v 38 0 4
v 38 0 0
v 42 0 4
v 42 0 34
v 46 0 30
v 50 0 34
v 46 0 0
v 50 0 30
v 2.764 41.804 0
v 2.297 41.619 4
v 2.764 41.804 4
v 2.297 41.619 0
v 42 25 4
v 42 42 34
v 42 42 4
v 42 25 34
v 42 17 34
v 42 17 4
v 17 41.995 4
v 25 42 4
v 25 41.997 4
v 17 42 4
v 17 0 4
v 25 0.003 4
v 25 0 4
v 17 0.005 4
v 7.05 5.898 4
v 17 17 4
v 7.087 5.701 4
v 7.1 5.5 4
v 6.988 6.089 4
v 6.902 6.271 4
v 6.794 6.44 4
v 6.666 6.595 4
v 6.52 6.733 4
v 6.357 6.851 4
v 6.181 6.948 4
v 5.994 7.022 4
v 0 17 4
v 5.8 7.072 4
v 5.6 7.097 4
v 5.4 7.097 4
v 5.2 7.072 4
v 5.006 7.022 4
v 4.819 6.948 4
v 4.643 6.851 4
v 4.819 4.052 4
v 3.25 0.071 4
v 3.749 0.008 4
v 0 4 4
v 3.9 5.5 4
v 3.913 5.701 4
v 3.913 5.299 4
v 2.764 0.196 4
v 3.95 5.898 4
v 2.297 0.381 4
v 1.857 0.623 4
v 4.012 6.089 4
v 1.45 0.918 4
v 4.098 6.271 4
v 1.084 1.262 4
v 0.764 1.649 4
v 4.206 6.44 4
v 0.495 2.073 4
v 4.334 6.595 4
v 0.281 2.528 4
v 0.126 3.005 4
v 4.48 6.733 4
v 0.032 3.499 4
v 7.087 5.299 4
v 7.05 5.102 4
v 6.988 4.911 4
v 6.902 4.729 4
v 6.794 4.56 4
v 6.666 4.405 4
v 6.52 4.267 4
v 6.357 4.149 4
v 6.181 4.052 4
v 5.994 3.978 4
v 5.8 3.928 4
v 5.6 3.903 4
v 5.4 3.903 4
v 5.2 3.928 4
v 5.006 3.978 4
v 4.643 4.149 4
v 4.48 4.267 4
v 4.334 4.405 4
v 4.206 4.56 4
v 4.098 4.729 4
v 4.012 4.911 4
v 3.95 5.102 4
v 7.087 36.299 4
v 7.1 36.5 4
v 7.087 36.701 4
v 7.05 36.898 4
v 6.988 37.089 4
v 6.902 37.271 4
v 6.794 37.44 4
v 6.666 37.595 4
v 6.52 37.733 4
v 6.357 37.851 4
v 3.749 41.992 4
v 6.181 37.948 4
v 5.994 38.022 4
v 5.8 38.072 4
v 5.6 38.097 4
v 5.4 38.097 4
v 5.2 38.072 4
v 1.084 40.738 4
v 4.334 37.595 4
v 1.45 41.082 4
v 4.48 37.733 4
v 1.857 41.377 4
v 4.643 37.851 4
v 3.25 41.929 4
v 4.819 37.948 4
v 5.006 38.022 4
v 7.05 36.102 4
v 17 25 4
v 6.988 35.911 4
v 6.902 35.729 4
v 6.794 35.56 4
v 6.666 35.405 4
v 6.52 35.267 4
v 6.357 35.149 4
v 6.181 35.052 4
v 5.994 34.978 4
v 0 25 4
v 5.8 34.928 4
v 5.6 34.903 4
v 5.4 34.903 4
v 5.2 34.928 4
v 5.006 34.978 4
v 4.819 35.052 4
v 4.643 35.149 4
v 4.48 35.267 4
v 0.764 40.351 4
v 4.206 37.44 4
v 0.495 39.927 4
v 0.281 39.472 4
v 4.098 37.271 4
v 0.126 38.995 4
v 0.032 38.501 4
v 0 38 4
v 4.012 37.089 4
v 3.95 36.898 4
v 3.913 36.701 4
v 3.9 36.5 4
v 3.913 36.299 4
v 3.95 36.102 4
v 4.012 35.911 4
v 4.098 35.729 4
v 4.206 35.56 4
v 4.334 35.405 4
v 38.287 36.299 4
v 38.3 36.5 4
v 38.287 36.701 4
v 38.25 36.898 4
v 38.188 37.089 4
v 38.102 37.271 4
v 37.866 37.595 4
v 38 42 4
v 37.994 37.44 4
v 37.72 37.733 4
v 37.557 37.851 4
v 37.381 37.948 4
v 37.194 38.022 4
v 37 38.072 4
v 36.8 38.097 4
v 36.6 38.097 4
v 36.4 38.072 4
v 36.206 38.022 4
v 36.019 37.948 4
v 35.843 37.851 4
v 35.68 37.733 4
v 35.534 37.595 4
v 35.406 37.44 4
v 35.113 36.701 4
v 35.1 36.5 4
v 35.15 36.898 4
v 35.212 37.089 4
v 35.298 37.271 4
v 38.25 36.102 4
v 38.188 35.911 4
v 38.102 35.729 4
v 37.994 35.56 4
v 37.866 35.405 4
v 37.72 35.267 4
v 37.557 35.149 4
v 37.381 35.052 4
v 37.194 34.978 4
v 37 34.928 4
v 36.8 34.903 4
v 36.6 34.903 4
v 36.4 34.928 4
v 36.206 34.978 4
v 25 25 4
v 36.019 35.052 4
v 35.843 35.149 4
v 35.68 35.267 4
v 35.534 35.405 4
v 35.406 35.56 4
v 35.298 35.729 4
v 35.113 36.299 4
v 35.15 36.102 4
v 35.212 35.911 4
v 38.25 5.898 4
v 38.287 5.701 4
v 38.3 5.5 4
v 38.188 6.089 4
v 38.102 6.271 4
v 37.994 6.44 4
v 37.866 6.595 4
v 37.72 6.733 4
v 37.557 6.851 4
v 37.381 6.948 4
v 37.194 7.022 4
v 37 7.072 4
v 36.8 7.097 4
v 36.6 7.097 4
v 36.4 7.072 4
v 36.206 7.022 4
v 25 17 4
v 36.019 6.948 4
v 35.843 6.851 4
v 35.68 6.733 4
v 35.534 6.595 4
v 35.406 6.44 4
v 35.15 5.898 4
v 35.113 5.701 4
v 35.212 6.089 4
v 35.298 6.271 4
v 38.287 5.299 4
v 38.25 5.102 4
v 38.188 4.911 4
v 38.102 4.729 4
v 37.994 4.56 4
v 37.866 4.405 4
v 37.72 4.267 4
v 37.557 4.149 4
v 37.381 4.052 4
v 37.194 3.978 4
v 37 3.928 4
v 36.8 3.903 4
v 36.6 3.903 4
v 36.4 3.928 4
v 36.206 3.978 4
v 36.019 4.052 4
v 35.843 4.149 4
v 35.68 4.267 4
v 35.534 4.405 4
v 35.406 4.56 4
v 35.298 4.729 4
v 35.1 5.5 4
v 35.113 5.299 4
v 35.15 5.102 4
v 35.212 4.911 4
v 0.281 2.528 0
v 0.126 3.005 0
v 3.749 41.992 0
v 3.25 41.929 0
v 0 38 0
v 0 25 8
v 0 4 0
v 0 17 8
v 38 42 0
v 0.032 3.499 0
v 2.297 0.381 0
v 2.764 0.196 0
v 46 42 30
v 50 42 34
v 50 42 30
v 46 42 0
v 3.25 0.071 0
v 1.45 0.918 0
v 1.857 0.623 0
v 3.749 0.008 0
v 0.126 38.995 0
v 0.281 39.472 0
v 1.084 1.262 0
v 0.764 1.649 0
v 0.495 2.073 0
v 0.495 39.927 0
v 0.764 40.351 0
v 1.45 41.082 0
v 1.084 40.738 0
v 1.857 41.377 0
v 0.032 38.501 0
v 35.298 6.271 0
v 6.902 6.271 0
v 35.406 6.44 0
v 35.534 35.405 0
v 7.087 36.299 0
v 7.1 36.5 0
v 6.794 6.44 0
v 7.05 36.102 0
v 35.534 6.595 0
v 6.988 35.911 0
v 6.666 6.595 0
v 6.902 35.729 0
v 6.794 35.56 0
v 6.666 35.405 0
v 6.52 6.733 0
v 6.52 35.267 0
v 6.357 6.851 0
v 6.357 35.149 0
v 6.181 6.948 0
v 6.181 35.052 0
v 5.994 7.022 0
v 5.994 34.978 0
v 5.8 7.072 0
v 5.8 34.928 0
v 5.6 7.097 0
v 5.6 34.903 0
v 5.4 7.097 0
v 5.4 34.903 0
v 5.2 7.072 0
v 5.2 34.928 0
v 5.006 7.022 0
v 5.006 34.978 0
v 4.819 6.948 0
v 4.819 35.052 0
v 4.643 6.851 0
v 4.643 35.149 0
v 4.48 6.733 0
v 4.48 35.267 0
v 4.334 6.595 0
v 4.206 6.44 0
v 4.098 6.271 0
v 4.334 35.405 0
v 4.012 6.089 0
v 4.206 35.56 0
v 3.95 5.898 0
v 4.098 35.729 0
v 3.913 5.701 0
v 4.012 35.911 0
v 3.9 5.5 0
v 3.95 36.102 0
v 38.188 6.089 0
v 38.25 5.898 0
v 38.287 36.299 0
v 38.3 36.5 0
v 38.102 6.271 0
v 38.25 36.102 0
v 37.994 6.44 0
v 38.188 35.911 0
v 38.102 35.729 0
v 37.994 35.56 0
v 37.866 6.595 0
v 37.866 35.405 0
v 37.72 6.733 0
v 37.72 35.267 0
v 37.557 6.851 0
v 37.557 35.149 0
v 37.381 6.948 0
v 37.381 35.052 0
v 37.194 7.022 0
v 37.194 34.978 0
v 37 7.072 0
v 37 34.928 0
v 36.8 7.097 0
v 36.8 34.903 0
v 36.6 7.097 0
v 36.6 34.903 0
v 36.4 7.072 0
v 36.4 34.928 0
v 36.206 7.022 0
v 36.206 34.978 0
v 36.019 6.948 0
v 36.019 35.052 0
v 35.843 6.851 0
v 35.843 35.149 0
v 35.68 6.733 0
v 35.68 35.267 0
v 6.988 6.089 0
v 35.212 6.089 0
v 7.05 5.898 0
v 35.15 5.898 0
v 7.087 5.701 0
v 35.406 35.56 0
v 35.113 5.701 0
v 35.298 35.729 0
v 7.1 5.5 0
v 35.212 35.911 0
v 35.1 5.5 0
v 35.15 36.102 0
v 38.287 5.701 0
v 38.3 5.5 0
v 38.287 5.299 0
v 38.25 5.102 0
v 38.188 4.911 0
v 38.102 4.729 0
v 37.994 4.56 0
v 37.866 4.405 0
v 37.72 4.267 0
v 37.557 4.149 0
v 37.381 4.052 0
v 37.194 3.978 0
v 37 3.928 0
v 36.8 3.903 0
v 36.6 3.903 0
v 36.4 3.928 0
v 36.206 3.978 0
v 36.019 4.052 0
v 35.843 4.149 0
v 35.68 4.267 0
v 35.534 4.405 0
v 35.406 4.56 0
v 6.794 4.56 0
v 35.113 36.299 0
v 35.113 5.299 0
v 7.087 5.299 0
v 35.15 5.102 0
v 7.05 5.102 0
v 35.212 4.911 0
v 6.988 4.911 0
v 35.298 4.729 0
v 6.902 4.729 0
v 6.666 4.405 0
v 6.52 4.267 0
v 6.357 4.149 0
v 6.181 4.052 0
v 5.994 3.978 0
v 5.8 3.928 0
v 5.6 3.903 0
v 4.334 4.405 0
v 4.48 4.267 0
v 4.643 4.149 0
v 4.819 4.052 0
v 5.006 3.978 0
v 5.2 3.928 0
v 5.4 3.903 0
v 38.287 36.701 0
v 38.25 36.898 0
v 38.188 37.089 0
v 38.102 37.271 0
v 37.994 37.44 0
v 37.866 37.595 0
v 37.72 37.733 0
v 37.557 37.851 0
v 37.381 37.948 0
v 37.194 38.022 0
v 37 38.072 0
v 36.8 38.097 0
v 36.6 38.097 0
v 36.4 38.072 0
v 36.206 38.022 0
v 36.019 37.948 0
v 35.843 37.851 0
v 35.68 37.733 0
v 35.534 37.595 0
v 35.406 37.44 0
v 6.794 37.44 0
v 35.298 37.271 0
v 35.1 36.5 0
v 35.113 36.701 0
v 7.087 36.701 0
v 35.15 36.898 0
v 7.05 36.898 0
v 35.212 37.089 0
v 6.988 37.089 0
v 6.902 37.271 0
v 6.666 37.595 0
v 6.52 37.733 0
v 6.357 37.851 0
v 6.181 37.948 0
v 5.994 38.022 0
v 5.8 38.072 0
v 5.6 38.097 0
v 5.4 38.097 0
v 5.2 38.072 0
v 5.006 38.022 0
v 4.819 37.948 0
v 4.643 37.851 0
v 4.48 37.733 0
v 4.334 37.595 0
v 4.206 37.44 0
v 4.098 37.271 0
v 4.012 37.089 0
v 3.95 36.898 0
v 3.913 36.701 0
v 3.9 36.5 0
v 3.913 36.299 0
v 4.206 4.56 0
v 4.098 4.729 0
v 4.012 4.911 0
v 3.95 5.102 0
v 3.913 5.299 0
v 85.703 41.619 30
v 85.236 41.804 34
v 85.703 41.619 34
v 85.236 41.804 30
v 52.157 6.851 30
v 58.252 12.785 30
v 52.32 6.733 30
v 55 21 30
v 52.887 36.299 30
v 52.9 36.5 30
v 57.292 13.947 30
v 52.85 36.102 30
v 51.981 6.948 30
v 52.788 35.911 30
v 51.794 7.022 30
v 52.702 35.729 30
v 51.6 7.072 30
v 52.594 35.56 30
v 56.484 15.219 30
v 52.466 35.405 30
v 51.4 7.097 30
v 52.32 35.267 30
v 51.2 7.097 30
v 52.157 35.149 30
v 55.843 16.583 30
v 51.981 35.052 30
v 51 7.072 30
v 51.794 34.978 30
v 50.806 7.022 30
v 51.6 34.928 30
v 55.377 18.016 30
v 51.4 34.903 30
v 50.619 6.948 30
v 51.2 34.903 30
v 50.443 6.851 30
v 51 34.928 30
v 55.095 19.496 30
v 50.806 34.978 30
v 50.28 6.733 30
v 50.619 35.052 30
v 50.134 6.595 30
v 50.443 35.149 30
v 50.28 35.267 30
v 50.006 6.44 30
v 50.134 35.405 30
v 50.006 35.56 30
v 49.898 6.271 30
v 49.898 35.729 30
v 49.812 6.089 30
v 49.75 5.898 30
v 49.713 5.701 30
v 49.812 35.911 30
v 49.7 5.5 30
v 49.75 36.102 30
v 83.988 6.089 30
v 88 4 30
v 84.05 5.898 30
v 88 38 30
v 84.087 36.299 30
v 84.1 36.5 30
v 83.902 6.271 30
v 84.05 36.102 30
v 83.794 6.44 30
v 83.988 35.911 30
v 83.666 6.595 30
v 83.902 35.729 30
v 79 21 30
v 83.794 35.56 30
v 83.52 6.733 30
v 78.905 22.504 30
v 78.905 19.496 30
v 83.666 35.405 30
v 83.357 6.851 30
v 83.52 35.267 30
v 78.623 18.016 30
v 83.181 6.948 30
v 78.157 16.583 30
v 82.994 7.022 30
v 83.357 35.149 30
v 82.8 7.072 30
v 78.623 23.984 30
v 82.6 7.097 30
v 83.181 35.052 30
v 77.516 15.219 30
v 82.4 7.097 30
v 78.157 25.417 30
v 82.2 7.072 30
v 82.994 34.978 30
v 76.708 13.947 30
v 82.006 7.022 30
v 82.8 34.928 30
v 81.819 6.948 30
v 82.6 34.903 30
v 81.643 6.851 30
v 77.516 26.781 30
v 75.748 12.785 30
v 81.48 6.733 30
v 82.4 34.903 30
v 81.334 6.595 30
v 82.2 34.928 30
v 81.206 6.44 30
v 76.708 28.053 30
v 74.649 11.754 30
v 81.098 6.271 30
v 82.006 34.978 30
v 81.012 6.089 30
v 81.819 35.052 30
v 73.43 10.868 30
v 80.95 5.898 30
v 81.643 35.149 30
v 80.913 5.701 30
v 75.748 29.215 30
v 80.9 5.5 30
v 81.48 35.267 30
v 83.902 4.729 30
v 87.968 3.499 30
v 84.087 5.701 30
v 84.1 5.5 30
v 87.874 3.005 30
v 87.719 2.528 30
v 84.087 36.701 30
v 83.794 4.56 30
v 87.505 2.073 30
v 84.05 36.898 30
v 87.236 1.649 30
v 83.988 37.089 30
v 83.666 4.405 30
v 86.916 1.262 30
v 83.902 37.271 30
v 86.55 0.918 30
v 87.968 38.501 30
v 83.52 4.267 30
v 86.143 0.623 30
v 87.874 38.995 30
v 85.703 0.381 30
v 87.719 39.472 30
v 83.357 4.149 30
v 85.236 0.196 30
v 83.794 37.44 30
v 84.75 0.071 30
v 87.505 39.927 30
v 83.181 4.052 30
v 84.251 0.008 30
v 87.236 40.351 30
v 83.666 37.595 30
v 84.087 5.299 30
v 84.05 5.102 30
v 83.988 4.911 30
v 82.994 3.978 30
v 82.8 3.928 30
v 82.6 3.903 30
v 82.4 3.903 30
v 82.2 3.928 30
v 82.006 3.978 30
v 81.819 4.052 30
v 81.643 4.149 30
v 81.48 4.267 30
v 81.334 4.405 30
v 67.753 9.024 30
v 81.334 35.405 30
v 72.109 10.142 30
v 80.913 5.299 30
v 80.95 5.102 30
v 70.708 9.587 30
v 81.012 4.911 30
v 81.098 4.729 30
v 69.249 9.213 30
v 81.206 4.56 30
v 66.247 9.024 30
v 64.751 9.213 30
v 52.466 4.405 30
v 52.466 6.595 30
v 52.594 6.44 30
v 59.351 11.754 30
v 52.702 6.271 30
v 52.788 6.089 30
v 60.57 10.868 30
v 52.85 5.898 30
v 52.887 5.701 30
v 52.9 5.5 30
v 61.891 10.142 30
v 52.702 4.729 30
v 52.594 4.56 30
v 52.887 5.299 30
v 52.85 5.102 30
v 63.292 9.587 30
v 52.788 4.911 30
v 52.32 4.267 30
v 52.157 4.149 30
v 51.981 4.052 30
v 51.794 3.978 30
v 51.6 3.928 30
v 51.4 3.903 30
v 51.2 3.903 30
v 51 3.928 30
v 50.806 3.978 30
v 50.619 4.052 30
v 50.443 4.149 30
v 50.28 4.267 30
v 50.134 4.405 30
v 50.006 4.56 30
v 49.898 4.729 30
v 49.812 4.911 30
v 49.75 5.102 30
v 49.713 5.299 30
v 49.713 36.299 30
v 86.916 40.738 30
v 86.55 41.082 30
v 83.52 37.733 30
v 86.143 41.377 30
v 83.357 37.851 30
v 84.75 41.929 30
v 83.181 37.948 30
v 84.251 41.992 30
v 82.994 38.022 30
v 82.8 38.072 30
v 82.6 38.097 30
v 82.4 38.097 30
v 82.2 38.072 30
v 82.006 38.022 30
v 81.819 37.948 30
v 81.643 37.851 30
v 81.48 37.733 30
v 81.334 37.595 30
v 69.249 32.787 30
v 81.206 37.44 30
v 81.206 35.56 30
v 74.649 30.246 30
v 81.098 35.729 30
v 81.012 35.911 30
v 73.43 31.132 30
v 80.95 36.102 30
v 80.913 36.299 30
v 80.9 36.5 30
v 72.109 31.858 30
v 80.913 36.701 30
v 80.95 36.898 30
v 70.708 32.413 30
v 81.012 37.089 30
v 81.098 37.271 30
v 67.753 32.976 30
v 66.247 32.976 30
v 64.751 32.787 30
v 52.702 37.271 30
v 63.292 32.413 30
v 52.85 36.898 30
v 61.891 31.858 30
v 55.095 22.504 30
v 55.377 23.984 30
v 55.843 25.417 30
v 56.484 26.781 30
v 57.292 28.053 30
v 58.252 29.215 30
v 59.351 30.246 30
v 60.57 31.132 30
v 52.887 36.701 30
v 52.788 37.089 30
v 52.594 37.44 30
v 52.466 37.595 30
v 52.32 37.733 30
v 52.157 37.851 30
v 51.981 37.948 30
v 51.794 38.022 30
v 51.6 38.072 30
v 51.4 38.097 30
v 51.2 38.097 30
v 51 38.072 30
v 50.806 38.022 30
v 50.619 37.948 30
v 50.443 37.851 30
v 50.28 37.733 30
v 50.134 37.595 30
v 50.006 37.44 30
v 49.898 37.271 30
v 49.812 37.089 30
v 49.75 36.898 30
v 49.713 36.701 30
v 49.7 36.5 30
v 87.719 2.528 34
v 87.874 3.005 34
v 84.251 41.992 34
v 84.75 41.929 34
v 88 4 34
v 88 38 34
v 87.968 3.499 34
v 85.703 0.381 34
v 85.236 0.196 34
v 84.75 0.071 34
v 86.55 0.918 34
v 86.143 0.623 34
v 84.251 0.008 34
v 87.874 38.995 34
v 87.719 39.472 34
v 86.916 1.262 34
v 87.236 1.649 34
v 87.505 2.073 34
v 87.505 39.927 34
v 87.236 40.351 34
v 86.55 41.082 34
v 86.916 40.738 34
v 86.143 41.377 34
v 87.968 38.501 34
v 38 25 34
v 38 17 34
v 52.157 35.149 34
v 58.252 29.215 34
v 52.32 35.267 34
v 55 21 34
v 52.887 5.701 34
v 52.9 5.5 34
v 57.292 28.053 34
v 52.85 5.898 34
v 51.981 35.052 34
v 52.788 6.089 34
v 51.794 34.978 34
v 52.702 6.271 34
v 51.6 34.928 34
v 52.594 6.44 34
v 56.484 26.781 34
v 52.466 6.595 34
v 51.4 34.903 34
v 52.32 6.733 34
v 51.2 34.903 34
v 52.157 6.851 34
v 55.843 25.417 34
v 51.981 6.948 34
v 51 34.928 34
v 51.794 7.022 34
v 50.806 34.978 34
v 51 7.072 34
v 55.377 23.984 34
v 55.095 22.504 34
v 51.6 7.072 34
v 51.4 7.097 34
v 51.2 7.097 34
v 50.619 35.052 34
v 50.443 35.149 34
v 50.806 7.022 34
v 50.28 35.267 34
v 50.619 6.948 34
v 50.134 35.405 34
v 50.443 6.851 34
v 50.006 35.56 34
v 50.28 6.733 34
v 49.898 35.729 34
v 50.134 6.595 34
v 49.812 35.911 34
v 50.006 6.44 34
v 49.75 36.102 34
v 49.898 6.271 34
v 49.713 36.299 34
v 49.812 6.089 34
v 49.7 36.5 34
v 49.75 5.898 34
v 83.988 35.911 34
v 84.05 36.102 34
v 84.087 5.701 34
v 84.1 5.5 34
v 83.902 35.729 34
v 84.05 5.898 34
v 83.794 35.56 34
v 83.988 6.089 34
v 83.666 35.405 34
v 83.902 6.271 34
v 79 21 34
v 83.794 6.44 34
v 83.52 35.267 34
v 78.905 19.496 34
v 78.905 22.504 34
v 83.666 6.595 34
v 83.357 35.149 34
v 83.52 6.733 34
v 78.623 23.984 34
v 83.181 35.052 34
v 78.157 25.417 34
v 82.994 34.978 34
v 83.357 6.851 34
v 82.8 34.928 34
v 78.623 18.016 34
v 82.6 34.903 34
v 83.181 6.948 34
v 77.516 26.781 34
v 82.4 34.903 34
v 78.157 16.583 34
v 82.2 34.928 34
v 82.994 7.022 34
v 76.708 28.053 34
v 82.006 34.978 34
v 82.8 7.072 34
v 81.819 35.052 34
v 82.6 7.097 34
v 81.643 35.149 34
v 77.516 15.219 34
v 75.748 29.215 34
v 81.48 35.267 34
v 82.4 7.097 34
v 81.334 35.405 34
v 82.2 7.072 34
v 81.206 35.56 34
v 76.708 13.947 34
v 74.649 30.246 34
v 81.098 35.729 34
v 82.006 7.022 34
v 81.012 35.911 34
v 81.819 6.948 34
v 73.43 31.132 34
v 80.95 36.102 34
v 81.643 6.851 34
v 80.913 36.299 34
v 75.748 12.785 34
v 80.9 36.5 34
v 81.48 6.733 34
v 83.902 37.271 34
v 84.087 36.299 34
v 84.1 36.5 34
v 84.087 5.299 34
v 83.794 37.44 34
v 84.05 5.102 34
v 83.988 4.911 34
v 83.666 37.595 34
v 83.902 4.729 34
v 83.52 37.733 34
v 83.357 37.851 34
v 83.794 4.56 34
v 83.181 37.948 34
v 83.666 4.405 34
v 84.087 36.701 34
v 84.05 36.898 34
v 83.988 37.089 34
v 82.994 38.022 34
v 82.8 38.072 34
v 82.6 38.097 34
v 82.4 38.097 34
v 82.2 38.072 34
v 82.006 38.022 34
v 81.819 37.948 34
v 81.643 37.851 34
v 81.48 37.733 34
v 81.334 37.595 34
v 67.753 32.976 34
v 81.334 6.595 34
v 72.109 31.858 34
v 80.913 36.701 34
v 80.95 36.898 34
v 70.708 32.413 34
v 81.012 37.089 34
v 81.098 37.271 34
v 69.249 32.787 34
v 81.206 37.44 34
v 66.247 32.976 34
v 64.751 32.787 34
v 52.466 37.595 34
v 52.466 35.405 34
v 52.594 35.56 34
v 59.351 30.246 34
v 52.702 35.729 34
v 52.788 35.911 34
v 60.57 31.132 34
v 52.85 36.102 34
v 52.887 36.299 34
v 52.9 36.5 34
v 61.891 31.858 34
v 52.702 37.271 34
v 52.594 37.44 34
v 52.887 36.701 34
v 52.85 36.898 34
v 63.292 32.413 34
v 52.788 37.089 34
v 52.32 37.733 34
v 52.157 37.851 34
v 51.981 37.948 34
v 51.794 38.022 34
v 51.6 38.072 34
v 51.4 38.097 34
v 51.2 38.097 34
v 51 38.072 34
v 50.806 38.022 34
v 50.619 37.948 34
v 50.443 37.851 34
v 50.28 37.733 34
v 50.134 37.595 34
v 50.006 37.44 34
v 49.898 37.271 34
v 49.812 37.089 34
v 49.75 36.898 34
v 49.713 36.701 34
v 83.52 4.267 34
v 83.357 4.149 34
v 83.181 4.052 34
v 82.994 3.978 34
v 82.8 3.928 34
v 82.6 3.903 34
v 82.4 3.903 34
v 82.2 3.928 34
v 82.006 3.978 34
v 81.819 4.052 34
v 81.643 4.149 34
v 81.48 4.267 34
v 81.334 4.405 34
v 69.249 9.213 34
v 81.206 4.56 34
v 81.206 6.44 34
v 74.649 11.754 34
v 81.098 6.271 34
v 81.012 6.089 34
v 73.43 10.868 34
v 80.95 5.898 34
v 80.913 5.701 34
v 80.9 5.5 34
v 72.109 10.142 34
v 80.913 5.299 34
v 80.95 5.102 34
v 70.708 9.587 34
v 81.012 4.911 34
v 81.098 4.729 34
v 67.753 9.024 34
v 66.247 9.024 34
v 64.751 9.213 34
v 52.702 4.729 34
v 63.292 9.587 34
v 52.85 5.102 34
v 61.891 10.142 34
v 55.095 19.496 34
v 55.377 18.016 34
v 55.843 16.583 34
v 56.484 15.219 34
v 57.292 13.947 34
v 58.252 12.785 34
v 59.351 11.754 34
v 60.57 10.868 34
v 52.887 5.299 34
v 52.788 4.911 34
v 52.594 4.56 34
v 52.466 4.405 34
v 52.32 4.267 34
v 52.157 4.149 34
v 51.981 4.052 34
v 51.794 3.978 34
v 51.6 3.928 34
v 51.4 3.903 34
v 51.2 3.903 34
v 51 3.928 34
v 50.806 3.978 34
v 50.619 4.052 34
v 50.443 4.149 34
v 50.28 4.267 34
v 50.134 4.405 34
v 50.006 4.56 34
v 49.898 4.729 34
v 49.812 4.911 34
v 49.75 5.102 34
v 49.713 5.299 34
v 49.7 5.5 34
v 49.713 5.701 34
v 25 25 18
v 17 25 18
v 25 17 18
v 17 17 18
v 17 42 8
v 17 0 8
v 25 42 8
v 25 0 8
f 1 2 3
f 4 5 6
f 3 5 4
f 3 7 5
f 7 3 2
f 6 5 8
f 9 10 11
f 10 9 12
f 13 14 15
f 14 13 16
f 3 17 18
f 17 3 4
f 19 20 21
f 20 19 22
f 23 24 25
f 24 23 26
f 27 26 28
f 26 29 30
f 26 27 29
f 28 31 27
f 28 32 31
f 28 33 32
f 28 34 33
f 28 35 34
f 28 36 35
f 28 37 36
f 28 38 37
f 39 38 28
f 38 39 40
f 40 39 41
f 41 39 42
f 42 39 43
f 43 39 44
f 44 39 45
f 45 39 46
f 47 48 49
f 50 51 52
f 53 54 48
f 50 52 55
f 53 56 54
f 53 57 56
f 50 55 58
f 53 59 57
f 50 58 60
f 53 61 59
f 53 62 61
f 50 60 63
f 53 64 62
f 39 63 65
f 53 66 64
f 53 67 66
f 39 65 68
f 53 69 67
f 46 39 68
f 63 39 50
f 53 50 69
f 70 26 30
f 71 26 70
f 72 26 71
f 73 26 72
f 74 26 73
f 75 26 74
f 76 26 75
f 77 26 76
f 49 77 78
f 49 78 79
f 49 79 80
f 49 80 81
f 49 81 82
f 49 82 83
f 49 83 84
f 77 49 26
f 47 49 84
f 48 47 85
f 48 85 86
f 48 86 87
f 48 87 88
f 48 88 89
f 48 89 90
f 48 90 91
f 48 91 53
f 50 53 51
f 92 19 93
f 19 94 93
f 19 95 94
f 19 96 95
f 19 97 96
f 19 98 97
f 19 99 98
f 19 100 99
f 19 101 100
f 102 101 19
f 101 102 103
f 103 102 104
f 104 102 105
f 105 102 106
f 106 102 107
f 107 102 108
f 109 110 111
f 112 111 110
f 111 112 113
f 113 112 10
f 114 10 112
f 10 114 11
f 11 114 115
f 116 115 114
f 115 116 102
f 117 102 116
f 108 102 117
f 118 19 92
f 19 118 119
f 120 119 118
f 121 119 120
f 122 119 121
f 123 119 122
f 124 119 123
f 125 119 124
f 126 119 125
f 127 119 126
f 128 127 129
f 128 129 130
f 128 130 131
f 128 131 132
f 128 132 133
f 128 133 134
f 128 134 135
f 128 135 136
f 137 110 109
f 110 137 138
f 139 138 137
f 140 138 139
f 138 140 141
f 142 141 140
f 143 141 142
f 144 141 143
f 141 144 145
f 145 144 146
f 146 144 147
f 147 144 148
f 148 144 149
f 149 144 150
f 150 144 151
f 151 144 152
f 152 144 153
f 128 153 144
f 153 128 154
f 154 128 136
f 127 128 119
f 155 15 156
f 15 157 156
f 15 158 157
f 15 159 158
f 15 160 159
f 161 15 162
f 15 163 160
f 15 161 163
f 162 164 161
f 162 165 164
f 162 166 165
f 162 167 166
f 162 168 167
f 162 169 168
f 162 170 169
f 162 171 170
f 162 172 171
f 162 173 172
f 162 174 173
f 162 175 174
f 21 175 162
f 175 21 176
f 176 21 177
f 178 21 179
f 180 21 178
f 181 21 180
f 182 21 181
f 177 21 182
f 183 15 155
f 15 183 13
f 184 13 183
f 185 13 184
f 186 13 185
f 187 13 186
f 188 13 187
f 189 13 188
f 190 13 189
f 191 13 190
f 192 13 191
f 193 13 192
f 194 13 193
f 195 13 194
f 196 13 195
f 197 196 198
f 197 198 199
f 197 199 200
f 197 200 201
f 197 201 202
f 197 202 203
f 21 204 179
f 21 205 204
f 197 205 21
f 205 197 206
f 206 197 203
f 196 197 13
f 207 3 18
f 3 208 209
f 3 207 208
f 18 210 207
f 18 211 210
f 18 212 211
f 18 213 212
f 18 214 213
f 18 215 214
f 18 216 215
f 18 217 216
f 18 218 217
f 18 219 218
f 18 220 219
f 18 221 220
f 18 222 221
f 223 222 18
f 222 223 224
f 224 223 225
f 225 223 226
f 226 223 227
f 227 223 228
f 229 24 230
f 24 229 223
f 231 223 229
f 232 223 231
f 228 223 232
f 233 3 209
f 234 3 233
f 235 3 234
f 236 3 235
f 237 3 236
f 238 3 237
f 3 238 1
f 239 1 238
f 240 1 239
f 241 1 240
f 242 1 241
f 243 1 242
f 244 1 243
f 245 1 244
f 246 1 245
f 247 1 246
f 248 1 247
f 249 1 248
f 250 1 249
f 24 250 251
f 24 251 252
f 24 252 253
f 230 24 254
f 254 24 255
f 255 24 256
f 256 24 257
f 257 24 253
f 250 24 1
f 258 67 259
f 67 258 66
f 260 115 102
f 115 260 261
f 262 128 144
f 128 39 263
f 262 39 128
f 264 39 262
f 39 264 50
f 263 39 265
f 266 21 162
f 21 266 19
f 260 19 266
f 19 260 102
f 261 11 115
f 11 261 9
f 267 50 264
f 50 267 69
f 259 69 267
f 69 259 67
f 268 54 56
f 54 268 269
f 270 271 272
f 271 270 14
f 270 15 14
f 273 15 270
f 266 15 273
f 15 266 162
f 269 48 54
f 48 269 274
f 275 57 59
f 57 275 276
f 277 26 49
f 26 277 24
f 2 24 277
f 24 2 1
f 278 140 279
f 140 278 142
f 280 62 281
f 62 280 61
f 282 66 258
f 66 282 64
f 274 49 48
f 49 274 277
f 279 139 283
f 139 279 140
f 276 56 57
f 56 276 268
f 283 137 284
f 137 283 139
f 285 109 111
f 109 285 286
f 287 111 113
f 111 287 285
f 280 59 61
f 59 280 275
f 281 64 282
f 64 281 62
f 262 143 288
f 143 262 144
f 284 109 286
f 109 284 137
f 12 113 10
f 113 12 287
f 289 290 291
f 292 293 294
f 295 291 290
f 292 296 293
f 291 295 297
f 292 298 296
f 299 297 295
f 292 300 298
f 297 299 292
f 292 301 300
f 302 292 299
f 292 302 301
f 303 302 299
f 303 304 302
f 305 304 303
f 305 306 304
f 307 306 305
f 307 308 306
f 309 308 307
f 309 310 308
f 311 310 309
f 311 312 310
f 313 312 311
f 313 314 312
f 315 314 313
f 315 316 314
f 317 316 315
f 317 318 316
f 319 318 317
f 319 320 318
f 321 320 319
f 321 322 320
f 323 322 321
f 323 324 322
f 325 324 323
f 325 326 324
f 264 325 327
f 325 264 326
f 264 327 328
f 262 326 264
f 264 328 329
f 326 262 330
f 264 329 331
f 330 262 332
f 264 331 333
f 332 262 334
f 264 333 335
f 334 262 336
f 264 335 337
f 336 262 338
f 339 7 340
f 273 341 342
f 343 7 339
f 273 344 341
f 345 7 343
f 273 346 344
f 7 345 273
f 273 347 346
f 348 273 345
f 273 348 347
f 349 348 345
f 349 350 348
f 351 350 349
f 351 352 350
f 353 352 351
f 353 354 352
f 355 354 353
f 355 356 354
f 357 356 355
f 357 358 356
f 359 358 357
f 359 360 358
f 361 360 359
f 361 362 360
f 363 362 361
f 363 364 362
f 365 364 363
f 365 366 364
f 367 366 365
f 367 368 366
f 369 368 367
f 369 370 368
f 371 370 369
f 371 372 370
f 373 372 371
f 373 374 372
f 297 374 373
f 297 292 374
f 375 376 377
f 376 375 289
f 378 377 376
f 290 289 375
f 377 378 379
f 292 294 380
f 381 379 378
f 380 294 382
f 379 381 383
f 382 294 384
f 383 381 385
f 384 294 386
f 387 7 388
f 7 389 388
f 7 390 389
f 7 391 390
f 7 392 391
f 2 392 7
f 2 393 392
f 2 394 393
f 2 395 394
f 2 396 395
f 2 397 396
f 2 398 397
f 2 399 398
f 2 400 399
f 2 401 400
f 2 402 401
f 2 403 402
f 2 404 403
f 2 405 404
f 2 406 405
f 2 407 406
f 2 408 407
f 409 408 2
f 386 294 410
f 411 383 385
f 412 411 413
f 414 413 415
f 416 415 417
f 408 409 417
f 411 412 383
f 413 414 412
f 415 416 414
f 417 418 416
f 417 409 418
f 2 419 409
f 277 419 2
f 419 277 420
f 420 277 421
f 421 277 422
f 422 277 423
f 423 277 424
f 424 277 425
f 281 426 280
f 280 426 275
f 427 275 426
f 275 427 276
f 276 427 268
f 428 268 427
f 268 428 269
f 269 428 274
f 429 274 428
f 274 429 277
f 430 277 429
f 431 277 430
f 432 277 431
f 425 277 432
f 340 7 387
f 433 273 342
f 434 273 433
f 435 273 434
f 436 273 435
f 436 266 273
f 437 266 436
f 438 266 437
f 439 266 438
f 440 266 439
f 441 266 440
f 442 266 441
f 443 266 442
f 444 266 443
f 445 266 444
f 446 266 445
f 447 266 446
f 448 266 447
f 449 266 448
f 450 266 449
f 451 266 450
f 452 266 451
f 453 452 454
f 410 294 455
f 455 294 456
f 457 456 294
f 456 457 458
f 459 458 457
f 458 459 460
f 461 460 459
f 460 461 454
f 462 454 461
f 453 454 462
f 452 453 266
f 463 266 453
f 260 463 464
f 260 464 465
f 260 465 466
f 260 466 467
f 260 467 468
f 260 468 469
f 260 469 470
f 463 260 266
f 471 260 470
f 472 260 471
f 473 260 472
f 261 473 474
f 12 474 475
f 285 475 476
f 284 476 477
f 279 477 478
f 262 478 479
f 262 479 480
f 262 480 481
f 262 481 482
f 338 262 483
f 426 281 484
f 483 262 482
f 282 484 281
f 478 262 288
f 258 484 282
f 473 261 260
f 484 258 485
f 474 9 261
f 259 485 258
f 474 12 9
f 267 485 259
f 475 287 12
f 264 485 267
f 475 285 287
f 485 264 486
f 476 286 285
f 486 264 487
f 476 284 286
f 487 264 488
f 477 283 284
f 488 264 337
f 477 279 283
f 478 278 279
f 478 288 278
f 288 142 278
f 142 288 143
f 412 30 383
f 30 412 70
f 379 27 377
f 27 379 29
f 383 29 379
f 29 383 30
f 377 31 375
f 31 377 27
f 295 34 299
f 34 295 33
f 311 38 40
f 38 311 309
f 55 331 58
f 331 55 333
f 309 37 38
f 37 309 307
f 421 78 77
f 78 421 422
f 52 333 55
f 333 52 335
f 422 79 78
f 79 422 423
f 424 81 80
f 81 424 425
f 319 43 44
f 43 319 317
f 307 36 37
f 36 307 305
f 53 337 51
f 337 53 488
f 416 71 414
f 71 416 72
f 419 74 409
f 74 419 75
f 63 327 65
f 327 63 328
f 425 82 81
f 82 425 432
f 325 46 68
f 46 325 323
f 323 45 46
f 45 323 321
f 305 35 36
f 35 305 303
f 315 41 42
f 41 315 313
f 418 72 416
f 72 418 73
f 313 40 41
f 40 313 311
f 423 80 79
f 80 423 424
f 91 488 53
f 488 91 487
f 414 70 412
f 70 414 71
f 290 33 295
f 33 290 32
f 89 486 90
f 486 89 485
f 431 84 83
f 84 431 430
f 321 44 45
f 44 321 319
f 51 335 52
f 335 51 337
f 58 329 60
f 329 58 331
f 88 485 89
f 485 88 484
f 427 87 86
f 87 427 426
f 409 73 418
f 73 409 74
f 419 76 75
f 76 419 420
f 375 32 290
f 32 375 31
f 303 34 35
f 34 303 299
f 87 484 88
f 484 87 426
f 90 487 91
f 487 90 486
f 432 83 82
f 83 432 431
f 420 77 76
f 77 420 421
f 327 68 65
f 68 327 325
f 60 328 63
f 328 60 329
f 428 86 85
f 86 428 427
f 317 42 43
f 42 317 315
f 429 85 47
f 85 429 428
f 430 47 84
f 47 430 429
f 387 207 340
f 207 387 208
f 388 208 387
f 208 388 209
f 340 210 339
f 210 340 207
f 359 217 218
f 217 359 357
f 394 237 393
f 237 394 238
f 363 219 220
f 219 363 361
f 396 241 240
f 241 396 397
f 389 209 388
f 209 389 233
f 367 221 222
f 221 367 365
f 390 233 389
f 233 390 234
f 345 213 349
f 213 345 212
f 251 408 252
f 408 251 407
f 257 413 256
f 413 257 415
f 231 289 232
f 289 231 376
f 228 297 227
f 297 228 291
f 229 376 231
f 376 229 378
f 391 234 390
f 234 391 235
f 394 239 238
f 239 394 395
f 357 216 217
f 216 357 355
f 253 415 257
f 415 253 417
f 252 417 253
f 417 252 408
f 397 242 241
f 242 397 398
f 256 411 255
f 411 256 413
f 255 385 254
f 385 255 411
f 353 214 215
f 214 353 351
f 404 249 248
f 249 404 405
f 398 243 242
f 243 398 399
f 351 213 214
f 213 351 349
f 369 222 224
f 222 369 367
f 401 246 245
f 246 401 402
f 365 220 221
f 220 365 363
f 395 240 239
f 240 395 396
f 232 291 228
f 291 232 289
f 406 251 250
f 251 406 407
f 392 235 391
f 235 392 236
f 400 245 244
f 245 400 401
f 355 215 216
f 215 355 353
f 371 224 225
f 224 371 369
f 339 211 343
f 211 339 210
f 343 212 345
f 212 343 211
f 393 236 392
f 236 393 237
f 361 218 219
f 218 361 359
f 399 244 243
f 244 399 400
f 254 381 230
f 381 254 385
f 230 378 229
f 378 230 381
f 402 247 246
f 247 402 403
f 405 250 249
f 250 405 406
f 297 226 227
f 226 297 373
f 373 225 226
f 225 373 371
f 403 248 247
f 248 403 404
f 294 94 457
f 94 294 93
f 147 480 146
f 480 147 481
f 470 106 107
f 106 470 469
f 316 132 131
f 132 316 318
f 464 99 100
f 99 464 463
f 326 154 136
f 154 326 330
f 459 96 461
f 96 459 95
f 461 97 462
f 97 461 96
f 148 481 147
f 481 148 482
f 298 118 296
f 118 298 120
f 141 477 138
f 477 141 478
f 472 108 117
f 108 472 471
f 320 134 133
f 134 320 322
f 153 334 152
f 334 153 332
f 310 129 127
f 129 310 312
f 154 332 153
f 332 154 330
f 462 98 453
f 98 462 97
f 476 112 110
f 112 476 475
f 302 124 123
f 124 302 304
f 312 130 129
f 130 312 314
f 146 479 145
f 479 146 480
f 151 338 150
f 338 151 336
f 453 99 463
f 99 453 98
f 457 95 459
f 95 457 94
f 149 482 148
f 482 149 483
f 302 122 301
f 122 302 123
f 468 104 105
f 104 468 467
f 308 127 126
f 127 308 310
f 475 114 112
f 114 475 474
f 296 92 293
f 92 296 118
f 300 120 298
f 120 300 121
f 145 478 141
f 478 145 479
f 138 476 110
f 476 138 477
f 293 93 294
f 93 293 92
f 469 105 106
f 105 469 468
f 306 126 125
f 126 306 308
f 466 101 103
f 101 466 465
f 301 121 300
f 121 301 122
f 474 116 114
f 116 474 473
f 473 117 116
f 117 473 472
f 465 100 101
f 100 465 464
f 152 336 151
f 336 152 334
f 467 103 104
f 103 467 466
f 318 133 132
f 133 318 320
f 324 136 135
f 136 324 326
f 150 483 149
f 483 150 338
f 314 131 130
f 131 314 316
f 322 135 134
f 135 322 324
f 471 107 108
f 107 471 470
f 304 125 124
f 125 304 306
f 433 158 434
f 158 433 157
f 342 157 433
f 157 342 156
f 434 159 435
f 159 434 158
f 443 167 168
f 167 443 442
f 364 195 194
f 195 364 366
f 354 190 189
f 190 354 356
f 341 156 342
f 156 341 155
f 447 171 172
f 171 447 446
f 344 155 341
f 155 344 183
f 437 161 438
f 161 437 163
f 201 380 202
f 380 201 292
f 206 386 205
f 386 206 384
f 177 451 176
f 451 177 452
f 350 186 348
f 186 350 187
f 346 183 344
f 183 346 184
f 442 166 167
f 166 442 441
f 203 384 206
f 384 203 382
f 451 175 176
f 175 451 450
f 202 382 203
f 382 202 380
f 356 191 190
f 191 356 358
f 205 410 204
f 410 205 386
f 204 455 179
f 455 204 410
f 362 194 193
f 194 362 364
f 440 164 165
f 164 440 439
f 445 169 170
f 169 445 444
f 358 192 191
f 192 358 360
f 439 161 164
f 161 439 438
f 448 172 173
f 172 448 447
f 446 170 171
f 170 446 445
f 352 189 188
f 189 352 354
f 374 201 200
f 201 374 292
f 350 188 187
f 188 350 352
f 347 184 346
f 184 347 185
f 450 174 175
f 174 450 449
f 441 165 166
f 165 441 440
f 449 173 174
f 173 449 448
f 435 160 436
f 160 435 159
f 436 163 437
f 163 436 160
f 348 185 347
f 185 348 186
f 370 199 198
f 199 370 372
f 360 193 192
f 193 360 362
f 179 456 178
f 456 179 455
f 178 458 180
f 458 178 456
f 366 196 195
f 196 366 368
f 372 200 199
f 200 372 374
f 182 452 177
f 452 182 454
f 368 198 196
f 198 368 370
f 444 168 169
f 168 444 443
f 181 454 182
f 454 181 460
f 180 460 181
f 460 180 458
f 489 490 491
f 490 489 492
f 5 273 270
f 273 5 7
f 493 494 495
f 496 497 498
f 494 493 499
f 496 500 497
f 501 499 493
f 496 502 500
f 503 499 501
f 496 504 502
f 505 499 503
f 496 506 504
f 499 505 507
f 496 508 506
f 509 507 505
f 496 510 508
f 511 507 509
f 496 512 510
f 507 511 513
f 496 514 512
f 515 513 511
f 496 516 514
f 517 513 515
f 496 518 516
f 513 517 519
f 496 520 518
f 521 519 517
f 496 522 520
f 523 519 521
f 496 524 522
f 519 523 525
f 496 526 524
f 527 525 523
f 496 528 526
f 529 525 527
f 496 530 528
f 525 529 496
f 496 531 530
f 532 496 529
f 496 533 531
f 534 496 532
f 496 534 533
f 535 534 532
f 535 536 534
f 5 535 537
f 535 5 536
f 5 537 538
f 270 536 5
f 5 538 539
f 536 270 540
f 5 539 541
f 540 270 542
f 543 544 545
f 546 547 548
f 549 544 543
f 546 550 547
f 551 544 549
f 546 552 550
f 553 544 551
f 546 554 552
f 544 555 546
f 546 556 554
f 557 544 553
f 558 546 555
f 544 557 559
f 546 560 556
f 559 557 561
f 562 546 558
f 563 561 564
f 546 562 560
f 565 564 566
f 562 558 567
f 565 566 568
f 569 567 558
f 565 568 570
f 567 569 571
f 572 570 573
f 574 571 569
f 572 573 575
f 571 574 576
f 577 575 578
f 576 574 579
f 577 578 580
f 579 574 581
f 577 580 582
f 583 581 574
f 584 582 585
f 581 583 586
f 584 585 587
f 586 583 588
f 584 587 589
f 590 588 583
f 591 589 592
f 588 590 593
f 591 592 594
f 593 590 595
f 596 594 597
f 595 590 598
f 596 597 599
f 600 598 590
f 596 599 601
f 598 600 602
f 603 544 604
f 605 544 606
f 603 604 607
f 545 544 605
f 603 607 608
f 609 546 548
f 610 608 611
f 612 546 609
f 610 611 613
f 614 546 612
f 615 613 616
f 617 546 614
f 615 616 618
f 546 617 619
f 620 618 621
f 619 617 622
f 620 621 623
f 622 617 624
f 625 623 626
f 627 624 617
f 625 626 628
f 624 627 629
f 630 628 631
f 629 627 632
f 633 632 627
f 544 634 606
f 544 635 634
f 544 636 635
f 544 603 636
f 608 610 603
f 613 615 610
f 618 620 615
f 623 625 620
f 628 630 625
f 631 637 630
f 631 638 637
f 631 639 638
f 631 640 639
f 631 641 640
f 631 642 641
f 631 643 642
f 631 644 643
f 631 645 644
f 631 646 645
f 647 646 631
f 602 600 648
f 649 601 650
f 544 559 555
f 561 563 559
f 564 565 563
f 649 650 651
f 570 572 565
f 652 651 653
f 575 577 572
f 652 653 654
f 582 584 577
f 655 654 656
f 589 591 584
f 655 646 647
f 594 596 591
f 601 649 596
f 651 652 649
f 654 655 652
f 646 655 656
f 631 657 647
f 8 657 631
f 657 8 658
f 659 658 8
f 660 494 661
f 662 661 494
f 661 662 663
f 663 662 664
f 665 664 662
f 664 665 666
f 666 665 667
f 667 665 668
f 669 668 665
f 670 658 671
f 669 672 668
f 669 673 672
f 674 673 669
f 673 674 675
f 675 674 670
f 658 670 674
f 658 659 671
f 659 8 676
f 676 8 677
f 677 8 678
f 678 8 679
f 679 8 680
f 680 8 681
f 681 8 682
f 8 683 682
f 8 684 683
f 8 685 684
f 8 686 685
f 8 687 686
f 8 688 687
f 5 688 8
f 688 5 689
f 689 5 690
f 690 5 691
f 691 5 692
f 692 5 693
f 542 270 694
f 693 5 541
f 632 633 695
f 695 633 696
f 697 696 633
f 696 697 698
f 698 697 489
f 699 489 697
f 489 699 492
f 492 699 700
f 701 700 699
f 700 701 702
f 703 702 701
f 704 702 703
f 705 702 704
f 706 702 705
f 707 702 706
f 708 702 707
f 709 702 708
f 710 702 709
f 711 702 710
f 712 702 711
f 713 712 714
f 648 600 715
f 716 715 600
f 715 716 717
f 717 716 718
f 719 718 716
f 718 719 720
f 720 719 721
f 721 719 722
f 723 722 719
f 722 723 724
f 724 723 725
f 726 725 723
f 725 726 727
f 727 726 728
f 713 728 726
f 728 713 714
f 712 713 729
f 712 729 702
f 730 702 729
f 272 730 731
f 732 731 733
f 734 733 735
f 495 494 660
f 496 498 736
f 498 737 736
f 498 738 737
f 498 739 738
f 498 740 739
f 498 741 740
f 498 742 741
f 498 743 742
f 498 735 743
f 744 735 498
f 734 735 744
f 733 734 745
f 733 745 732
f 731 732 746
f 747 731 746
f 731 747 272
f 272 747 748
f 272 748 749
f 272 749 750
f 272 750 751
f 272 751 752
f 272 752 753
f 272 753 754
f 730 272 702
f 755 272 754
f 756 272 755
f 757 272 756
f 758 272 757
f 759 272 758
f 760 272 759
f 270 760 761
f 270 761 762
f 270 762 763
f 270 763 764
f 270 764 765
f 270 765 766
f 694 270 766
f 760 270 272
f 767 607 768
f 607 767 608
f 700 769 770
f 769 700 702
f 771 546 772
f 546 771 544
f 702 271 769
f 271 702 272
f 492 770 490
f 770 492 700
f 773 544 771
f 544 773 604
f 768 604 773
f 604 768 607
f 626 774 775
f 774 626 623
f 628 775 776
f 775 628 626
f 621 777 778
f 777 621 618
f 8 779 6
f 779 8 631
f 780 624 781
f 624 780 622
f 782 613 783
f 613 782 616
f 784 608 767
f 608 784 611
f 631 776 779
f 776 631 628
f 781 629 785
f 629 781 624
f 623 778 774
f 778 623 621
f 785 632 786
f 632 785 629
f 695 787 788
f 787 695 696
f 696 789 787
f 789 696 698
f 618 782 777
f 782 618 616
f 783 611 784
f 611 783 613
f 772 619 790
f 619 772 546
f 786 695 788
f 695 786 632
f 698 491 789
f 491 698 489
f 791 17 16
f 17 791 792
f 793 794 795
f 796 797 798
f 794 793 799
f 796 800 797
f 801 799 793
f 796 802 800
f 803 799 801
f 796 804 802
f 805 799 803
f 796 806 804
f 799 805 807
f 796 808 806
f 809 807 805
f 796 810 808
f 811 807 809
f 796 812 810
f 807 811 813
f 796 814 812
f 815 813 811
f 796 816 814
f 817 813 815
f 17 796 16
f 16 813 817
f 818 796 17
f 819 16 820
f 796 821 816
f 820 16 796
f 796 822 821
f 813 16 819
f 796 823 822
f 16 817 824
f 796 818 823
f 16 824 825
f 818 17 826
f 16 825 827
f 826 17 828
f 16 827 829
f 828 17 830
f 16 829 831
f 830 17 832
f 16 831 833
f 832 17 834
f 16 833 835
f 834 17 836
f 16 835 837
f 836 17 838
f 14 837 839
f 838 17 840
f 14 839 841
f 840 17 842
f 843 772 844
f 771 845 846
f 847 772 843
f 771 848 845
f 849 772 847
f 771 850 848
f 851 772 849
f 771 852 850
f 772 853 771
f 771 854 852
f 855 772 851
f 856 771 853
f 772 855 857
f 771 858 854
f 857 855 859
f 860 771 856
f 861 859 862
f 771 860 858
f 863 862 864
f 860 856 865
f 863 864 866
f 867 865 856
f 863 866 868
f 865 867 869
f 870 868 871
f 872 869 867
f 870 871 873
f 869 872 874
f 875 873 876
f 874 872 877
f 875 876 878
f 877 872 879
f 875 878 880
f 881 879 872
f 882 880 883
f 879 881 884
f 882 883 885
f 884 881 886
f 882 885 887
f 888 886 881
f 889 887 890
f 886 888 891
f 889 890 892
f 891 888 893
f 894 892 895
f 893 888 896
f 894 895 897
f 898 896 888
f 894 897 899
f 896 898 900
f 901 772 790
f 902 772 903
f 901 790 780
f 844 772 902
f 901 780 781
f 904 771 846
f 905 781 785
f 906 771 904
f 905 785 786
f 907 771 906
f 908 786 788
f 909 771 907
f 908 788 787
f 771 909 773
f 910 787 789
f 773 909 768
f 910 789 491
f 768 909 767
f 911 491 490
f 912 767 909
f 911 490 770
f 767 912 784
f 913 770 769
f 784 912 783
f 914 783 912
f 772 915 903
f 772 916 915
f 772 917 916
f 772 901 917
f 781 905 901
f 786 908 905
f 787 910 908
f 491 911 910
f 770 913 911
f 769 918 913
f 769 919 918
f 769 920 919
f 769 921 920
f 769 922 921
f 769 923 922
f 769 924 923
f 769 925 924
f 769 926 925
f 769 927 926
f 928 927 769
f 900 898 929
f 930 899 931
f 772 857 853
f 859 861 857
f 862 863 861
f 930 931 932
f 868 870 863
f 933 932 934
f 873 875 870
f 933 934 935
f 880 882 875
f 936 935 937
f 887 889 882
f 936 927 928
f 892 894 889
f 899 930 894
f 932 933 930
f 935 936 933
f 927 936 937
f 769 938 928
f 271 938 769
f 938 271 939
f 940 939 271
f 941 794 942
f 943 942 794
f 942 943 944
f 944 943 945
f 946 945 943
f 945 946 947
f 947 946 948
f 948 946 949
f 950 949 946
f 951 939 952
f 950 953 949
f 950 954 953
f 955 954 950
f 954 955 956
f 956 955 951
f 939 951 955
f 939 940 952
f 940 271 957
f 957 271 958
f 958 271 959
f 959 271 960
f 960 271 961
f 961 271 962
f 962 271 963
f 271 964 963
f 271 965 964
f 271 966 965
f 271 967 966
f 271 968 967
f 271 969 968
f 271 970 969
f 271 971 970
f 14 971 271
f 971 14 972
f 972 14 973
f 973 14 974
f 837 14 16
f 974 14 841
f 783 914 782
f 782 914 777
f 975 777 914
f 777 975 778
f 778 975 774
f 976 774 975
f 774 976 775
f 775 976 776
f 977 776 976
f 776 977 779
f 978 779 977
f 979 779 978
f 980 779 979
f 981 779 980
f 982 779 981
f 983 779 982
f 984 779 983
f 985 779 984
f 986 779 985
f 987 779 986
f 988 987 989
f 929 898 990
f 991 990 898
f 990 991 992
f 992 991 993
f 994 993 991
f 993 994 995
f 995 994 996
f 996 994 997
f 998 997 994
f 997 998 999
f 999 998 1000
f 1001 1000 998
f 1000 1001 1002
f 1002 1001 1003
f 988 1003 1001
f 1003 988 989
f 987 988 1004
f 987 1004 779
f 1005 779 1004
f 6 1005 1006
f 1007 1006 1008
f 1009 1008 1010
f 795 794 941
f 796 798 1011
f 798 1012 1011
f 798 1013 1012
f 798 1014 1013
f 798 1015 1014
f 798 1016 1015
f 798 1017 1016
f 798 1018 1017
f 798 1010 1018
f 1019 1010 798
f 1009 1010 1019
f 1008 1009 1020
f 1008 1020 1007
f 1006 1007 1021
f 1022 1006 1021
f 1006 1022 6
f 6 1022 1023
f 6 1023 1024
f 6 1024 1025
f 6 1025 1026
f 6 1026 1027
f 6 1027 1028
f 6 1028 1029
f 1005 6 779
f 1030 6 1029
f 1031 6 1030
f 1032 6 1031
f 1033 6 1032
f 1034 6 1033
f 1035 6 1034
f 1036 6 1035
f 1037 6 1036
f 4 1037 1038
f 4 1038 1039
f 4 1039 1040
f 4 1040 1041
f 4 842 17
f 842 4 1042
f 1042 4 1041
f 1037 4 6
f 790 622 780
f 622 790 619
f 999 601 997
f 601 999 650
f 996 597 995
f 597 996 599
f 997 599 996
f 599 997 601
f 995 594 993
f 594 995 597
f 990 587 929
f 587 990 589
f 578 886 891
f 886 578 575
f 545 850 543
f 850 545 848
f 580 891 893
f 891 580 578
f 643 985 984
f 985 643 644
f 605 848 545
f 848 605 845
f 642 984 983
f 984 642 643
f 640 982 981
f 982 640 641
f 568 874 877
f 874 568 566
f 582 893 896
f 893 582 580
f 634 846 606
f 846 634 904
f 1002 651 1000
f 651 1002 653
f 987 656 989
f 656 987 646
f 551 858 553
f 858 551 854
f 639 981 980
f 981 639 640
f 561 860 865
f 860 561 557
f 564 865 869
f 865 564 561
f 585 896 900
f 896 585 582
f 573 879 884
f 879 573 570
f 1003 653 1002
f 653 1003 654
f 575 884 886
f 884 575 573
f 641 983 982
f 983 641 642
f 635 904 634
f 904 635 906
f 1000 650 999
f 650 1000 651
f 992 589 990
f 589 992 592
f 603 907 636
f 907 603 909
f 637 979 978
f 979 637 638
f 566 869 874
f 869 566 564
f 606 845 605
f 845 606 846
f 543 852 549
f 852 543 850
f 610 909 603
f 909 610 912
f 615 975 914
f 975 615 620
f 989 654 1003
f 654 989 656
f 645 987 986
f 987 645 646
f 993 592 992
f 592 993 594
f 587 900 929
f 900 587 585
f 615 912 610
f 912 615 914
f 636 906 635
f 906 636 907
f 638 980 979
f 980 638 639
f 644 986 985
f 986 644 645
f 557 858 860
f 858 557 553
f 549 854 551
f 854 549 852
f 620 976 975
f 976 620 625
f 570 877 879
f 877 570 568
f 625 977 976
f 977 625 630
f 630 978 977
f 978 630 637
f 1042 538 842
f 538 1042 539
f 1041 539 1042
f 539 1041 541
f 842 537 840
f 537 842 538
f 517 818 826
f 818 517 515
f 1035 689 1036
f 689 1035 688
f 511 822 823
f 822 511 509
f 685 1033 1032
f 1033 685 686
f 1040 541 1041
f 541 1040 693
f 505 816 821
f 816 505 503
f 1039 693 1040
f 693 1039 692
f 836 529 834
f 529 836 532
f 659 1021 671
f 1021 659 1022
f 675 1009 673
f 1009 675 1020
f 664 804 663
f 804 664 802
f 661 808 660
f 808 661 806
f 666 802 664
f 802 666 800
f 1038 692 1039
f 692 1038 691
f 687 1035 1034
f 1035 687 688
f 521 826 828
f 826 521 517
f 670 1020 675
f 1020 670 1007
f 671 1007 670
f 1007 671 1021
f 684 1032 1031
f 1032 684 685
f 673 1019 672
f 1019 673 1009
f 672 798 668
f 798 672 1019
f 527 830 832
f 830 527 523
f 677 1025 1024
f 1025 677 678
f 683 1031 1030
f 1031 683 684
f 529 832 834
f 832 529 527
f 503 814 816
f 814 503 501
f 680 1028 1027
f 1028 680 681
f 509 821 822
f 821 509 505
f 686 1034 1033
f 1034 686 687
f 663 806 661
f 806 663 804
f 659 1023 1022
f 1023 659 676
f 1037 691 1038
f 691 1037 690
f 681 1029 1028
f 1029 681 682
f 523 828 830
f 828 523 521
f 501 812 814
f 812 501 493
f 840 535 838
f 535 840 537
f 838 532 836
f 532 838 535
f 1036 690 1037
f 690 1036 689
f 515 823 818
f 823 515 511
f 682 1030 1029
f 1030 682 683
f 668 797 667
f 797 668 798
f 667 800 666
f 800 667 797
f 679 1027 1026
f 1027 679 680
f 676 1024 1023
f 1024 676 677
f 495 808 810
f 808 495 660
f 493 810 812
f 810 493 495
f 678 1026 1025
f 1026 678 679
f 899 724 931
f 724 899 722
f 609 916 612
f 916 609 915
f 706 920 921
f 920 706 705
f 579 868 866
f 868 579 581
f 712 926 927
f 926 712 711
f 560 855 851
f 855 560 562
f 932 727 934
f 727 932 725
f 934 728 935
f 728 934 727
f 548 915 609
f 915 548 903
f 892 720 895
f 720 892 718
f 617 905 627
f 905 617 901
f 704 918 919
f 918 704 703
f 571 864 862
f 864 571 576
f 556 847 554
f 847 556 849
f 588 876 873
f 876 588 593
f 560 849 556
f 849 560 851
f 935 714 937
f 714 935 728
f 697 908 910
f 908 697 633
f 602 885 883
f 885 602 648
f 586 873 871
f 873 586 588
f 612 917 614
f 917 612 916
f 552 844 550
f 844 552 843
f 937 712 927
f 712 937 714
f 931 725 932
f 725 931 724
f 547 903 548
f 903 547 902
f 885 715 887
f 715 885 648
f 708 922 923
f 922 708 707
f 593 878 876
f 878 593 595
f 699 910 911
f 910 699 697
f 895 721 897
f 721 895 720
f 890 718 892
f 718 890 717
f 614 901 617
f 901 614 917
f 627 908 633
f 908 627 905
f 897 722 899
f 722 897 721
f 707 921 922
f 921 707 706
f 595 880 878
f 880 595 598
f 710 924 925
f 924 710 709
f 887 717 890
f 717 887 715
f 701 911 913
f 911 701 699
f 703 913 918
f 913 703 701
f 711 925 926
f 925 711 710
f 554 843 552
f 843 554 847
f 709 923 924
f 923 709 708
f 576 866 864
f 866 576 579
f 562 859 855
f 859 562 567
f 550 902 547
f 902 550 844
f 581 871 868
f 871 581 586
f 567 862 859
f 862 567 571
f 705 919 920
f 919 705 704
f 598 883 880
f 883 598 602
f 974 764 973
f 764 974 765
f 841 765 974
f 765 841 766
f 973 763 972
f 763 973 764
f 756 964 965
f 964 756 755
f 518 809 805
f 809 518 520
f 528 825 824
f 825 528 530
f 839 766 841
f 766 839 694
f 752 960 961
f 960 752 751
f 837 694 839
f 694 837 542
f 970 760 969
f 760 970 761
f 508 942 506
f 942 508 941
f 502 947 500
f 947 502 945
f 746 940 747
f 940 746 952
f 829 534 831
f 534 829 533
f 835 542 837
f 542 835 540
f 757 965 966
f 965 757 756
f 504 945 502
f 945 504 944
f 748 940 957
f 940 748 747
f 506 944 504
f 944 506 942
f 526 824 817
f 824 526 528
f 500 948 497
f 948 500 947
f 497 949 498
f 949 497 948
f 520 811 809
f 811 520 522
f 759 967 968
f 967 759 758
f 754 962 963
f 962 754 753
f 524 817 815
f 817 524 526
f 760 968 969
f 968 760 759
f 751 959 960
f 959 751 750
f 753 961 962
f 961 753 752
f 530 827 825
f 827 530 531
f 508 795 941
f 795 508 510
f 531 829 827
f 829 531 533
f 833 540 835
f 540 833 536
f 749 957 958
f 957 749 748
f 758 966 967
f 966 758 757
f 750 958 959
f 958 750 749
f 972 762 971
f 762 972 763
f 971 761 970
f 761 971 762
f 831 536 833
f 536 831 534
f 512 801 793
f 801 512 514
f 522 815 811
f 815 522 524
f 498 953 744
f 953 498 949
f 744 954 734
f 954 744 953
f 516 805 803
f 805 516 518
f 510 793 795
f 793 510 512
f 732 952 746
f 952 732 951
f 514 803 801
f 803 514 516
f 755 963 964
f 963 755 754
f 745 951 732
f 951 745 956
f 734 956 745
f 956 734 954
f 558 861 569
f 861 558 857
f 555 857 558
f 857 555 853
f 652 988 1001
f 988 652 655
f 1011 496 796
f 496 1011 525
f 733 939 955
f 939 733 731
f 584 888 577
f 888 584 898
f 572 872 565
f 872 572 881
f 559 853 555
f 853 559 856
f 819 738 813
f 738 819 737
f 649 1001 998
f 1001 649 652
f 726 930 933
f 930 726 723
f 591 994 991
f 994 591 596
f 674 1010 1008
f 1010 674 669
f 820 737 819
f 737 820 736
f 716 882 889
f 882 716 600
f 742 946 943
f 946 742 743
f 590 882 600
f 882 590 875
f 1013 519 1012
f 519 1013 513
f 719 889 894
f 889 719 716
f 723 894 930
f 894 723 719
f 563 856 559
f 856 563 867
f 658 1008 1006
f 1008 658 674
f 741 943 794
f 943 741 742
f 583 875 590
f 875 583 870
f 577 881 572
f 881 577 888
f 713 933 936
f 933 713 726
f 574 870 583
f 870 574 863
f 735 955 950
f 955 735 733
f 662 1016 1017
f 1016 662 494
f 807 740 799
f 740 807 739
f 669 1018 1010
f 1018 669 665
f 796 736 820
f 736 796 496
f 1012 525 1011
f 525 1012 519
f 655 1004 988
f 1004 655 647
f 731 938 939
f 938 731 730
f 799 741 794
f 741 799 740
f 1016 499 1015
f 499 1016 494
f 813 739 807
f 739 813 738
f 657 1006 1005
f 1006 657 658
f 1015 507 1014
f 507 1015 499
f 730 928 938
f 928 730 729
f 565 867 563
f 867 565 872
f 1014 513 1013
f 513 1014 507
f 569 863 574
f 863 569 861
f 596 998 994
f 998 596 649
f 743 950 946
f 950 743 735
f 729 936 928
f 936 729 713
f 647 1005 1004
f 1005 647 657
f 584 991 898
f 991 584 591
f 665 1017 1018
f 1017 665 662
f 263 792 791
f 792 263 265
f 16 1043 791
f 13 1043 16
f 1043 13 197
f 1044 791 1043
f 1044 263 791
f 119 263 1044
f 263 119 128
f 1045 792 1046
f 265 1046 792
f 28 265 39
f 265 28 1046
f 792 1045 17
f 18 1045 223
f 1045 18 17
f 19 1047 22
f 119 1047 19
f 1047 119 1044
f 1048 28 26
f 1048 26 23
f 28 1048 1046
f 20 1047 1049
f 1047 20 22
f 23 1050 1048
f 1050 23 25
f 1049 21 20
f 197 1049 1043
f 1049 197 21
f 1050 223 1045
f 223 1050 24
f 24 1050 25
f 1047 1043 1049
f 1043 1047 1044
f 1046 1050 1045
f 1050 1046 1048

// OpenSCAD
l = 42;
w = 42;

module plate() {

    difference() {

        // base
        hull() {
           translate([4,4,0]) cylinder($fn=50, r=4,h=4);
           translate([4,w-4,0]) cylinder($fn=50, r=4,h=4);
            translate([l-4,0,0]) cube([4,4,4]); //translate([l-4,4,0]) cylinder($fn=50, r=4,h=4);
           //translate([l-4,w-4,0]) cylinder($fn=50, r=4,h=4);
            translate([l-4,w-4,0]) cube([4,4,4]);
        }

        translate([3.9+1.6,3.9+1.6,-1]) cylinder($fn=50, r=1.6,h=6);
        translate([3.9+1.6+ 28 +3.2, 3.9+1.6,-1]) cylinder($fn=50, r=1.6,h=6);
        
        translate([3.9 + 1.6, w-3.9-1.6, -1]) cylinder($fn=50, r=1.6,h=6);
        translate([3.9+1.6+ 28 +3.2, w-3.9-1.6, -1]) cylinder($fn=50, r=1.6,h=6);  
       
    }
}
//color("red") cube([l,w,2]);

diff = 30;

// platform one
plate();

// platform two containing hole in the center
translate([2*w+4,0,diff+4]) difference() {
   rotate([0,180,0]) plate();
   translate([-w/2, w/2, -5])cylinder($fn=50, r=12,h=6);  
}
translate([w,0,0]) cube([4,w,diff+4]);

// support on the left from left to right
hull() {
    translate([0,w/2-4,4]) cube([4,8,4]);
    translate([w-4,w/2-4,0]) cube([4,8,4]);
    translate([w-4,w/2-4,diff]) cube([4,8,4]);
}

// support from on the left from front to back
hull() {
    translate([w/2-4, 0, 4]) cube([8,4,4]);
    translate([w/2-4, w-4, 4]) cube([8,4,4]);
    translate([w/2-4, w/2-4, diff/3+4]) cube([8,8,4]);
}
